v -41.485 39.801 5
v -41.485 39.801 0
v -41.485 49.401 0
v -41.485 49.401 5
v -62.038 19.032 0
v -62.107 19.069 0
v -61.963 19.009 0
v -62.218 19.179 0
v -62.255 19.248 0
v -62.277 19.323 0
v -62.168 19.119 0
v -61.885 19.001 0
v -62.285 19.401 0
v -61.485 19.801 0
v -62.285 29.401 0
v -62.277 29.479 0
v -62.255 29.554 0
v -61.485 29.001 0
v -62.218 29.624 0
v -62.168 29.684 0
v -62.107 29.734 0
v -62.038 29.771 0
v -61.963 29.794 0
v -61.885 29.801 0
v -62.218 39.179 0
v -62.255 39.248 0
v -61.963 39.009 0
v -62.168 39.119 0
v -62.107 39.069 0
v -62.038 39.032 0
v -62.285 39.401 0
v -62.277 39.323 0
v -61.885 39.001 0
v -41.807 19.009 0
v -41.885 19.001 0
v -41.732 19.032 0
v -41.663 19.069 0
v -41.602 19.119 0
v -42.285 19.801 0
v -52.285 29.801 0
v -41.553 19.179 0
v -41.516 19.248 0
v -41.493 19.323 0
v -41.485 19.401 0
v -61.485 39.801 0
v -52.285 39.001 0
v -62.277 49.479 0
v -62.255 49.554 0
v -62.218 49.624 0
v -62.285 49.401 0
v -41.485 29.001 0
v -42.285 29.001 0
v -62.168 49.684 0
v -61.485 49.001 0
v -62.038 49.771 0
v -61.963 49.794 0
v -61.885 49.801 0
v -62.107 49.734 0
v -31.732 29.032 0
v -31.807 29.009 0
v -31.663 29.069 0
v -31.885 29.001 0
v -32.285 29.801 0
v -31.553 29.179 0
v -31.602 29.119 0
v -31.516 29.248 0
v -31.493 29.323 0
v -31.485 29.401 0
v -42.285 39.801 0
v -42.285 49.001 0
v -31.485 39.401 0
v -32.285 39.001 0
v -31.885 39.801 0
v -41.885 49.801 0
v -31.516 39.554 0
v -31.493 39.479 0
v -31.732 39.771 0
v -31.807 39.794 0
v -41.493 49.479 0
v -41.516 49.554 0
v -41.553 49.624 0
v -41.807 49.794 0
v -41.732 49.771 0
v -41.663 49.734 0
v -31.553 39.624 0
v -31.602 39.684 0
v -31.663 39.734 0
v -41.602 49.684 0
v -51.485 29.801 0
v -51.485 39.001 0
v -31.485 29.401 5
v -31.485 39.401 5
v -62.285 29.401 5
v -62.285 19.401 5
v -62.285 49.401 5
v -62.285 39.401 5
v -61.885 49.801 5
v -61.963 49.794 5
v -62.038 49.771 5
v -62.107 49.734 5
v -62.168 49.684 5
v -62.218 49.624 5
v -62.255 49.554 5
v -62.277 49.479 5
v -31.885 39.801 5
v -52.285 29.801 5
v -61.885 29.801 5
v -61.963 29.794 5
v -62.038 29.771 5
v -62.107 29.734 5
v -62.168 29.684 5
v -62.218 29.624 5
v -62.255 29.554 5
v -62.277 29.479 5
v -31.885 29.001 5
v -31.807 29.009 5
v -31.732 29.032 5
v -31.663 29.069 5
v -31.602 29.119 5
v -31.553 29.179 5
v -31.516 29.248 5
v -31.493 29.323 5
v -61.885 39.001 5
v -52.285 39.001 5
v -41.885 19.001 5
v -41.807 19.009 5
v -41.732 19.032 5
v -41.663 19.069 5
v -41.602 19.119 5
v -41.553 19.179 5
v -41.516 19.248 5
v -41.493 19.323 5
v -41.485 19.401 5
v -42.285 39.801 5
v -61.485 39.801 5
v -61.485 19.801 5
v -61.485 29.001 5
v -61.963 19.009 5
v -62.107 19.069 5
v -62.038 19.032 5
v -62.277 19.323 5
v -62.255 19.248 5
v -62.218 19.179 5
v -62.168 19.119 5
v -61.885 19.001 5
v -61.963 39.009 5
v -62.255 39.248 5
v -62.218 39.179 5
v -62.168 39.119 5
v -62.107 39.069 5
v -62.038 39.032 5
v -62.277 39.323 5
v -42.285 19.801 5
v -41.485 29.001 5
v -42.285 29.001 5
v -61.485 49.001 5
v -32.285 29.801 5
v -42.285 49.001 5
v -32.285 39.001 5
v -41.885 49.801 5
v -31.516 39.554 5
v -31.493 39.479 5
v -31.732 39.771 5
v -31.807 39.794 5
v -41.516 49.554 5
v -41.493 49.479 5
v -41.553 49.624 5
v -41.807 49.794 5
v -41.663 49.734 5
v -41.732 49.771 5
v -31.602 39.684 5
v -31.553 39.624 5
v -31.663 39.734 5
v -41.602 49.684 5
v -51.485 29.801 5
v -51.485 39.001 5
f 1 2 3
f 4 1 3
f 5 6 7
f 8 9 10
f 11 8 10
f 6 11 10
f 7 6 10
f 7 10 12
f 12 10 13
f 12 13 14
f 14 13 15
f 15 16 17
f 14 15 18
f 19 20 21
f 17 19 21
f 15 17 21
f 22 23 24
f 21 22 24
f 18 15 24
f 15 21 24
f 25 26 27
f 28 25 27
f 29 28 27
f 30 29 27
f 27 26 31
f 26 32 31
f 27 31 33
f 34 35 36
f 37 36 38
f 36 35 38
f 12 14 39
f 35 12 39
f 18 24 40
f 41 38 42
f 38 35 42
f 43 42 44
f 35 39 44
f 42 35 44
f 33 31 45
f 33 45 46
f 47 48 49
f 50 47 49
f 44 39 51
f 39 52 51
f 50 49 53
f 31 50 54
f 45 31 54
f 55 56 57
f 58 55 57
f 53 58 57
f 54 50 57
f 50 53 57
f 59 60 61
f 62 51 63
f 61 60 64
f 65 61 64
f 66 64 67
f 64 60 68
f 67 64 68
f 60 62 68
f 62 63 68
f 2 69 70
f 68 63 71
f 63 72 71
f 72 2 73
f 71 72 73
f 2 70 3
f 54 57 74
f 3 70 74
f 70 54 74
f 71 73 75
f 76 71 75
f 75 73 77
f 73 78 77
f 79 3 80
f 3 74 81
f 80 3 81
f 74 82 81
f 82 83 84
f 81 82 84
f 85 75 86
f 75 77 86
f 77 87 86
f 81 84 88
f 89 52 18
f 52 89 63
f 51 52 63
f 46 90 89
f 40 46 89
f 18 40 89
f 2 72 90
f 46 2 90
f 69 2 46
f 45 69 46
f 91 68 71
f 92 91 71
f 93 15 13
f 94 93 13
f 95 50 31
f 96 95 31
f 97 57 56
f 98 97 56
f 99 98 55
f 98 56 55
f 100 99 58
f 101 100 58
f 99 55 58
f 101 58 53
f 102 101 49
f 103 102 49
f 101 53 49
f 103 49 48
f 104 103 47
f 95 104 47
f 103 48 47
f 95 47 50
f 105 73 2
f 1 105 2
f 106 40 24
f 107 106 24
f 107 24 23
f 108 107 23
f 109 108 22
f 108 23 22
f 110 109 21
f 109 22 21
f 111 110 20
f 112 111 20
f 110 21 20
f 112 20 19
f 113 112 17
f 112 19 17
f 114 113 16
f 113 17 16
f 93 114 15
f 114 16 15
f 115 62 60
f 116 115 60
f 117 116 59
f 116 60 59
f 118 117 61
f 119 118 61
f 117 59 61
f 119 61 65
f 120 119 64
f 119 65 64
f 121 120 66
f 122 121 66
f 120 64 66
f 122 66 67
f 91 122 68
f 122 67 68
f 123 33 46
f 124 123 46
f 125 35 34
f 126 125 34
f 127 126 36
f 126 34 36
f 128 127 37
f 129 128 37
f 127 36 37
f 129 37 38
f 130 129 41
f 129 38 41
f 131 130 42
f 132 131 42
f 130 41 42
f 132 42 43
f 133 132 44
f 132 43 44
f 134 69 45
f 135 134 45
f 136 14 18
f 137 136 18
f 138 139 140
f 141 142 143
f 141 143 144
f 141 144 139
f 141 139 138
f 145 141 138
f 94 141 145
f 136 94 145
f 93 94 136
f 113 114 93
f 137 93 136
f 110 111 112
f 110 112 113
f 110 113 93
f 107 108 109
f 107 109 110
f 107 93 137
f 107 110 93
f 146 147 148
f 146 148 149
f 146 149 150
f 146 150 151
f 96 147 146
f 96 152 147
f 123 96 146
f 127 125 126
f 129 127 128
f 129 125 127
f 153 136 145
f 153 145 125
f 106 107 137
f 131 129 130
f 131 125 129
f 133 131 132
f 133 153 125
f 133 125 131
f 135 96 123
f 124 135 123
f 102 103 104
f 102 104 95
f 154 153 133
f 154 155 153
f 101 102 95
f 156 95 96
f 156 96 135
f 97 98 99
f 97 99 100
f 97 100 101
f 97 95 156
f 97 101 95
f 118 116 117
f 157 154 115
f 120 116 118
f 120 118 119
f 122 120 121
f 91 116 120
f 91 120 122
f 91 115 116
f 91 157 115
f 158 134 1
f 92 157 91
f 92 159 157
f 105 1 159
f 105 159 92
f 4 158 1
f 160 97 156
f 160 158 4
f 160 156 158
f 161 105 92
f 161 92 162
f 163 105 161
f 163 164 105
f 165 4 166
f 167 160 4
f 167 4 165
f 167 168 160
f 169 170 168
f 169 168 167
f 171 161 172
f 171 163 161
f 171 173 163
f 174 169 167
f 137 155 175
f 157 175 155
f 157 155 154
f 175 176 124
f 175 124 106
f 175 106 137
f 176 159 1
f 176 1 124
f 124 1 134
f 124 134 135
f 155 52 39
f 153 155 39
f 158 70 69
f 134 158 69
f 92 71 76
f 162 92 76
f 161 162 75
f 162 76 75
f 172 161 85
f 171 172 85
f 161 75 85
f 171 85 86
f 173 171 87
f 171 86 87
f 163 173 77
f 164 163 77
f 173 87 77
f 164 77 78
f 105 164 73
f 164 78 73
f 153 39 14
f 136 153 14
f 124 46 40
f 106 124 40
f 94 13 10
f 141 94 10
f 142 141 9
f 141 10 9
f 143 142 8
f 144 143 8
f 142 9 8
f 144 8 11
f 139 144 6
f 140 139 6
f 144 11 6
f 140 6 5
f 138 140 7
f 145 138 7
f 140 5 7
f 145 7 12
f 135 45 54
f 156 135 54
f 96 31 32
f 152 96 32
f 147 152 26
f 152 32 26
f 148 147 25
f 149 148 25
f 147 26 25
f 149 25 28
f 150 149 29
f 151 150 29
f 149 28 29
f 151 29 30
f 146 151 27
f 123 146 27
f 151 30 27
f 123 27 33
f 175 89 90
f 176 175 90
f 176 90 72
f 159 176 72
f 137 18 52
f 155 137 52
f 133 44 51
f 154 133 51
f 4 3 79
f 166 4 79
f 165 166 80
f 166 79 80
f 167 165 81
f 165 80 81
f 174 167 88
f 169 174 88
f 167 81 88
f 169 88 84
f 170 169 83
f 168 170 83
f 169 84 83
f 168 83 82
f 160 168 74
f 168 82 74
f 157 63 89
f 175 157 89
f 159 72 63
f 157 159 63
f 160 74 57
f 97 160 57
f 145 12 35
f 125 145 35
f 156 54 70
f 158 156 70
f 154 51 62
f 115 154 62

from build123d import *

# Parameters (mm, degrees)
F1_DEPTH = 5


with BuildPart() as f1:
    # F0 (on Top) → F1 (new body)
    with BuildSketch(Plane.XY):
        with BuildLine():
            Line((-41.8851405949, 29.0013556838), (-42.2851405949, 29.0013556838))
            Line((-42.2851405949, 29.0013556838), (-42.2851405949, 19.8013556838))
            Line((-42.2851405949, 19.8013556838), (-41.8851405949, 19.8013556838))
            ThreePointArc((-41.8851405949, 19.8013556838), (-41.6022978824, 19.6841983963), (-41.4851405949, 19.4013556838))
            Line((-41.4851405949, 19.4013556838), (-41.4851405949, 29.0013556838))
            Line((-41.4851405949, 29.0013556838), (-41.8851405949, 29.0013556838))
        make_face()
        with BuildLine():
            ThreePointArc((-41.4851405949, 39.4013556838), (-41.6022978824, 39.1185129713), (-41.8851405949, 39.0013556838))
            Line((-41.8851405949, 39.0013556838), (-32.2851405949, 39.0013556838))
            Line((-32.2851405949, 39.0013556838), (-32.2851405949, 39.4013556838))
            ThreePointArc((-32.2851405949, 39.4013556838), (-32.1679833073, 39.6841983963), (-31.8851405949, 39.8013556838))
            Line((-31.8851405949, 39.8013556838), (-41.4851405949, 39.8013556838))
            Line((-41.4851405949, 39.8013556838), (-41.4851405949, 39.4013556838))
        make_face()
        Polygon((-52.2851405949, 39.0013556838), (-52.2851405949, 29.8013556838), (-51.8851405949, 29.8013556838), (-51.4851405949, 29.8013556838), (-51.4851405949, 39.0013556838), (-51.8851405949, 39.0013556838), align=None)
        with BuildLine():
            Line((-62.2851405949, 49.4013556838), (-62.2851405949, 39.4013556838))
            ThreePointArc((-62.2851405949, 39.4013556838), (-62.1679833073, 39.6841983963), (-61.8851405949, 39.8013556838))
            Line((-61.8851405949, 39.8013556838), (-61.4851405949, 39.8013556838))
            Line((-61.4851405949, 39.8013556838), (-61.4851405949, 49.0013556838))
            Line((-61.4851405949, 49.0013556838), (-61.8851405949, 49.0013556838))
            ThreePointArc((-61.8851405949, 49.0013556838), (-62.1679833073, 49.1185129713), (-62.2851405949, 49.4013556838))
        make_face()
        with BuildLine():
            Line((-41.8851405949, 49.8013556838), (-61.8851405949, 49.8013556838))
            ThreePointArc((-61.8851405949, 49.8013556838), (-61.6022978824, 49.6841983963), (-61.4851405949, 49.4013556838))
            Line((-61.4851405949, 49.4013556838), (-61.4851405949, 49.0013556838))
            Line((-61.4851405949, 49.0013556838), (-42.2851405949, 49.0013556838))
            Line((-42.2851405949, 49.0013556838), (-42.2851405949, 49.4013556838))
            ThreePointArc((-42.2851405949, 49.4013556838), (-42.1679833073, 49.6841983963), (-41.8851405949, 49.8013556838))
        make_face()
        with BuildLine():
            Line((-61.4851405949, 29.0013556838), (-61.8851405949, 29.0013556838))
            ThreePointArc((-61.8851405949, 29.0013556838), (-62.1679833073, 29.1185129713), (-62.2851405949, 29.4013556838))
            Line((-62.2851405949, 29.4013556838), (-62.2851405949, 19.4013556838))
            ThreePointArc((-62.2851405949, 19.4013556838), (-62.1679833073, 19.6841983963), (-61.8851405949, 19.8013556838))
            Line((-61.8851405949, 19.8013556838), (-61.4851405949, 19.8013556838))
            Line((-61.4851405949, 19.8013556838), (-61.4851405949, 29.0013556838))
        make_face()
        with BuildLine():
            Line((-42.2851405949, 19.8013556838), (-61.4851405949, 19.8013556838))
            Line((-61.4851405949, 19.8013556838), (-61.4851405949, 19.4013556838))
            ThreePointArc((-61.4851405949, 19.4013556838), (-61.6022978824, 19.1185129713), (-61.8851405949, 19.0013556838))
            Line((-61.8851405949, 19.0013556838), (-41.8851405949, 19.0013556838))
            ThreePointArc((-41.8851405949, 19.0013556838), (-42.1679833073, 19.1185129713), (-42.2851405949, 19.4013556838))
            Line((-42.2851405949, 19.4013556838), (-42.2851405949, 19.8013556838))
        make_face()
        with BuildLine():
            Line((-32.2851405949, 39.0013556838), (-32.2851405949, 29.8013556838))
            Line((-32.2851405949, 29.8013556838), (-31.8851405949, 29.8013556838))
            ThreePointArc((-31.8851405949, 29.8013556838), (-31.6022978824, 29.6841983963), (-31.4851405949, 29.4013556838))
            Line((-31.4851405949, 29.4013556838), (-31.4851405949, 39.4013556838))
            ThreePointArc((-31.4851405949, 39.4013556838), (-31.6022978824, 39.1185129713), (-31.8851405949, 39.0013556838))
            Line((-31.8851405949, 39.0013556838), (-32.2851405949, 39.0013556838))
        make_face()
        with BuildLine():
            Line((-61.8851405949, 39.0013556838), (-52.2851405949, 39.0013556838))
            Line((-52.2851405949, 39.0013556838), (-52.2851405949, 39.4013556838))
            ThreePointArc((-52.2851405949, 39.4013556838), (-52.1679833073, 39.6841983963), (-51.8851405949, 39.8013556838))
            Line((-51.8851405949, 39.8013556838), (-61.4851405949, 39.8013556838))
            Line((-61.4851405949, 39.8013556838), (-61.4851405949, 39.4013556838))
            ThreePointArc((-61.4851405949, 39.4013556838), (-61.6022978824, 39.1185129713), (-61.8851405949, 39.0013556838))
        make_face()
        with BuildLine():
            Line((-42.2851405949, 49.0013556838), (-42.2851405949, 39.8013556838))
            Line((-42.2851405949, 39.8013556838), (-41.8851405949, 39.8013556838))
            Line((-41.8851405949, 39.8013556838), (-41.4851405949, 39.8013556838))
            Line((-41.4851405949, 39.8013556838), (-41.4851405949, 49.4013556838))
            ThreePointArc((-41.4851405949, 49.4013556838), (-41.6022978824, 49.1185129713), (-41.8851405949, 49.0013556838))
            Line((-41.8851405949, 49.0013556838), (-42.2851405949, 49.0013556838))
        make_face()
        with BuildLine():
            Line((-51.4851405949, 39.4013556838), (-51.4851405949, 39.0013556838))
            Line((-51.4851405949, 39.0013556838), (-41.8851405949, 39.0013556838))
            ThreePointArc((-41.8851405949, 39.0013556838), (-42.1679833073, 39.1185129713), (-42.2851405949, 39.4013556838))
            Line((-42.2851405949, 39.4013556838), (-42.2851405949, 39.8013556838))
            Line((-42.2851405949, 39.8013556838), (-51.8851405949, 39.8013556838))
            ThreePointArc((-51.8851405949, 39.8013556838), (-51.6022978824, 39.6841983963), (-51.4851405949, 39.4013556838))
        make_face()
        with BuildLine():
            ThreePointArc((-41.8851405949, 29.8013556838), (-41.6022978824, 29.6841983963), (-41.4851405949, 29.4013556838))
            Line((-41.4851405949, 29.4013556838), (-41.4851405949, 29.0013556838))
            Line((-41.4851405949, 29.0013556838), (-31.8851405949, 29.0013556838))
            ThreePointArc((-31.8851405949, 29.0013556838), (-32.1679833073, 29.1185129713), (-32.2851405949, 29.4013556838))
            Line((-32.2851405949, 29.4013556838), (-32.2851405949, 29.8013556838))
            Line((-32.2851405949, 29.8013556838), (-41.8851405949, 29.8013556838))
        make_face()
        with BuildLine():
            Line((-61.4851405949, 29.4013556838), (-61.4851405949, 29.0013556838))
            Line((-61.4851405949, 29.0013556838), (-51.8851405949, 29.0013556838))
            ThreePointArc((-51.8851405949, 29.0013556838), (-52.1679833073, 29.1185129713), (-52.2851405949, 29.4013556838))
            Line((-52.2851405949, 29.4013556838), (-52.2851405949, 29.8013556838))
            Line((-52.2851405949, 29.8013556838), (-61.8851405949, 29.8013556838))
            ThreePointArc((-61.8851405949, 29.8013556838), (-61.6022978824, 29.6841983963), (-61.4851405949, 29.4013556838))
        make_face()
        with BuildLine():
            ThreePointArc((-51.4851405949, 29.4013556838), (-51.6022978824, 29.1185129713), (-51.8851405949, 29.0013556838))
            Line((-51.8851405949, 29.0013556838), (-42.2851405949, 29.0013556838))
            Line((-42.2851405949, 29.0013556838), (-42.2851405949, 29.4013556838))
            ThreePointArc((-42.2851405949, 29.4013556838), (-42.1679833073, 29.6841983963), (-41.8851405949, 29.8013556838))
            Line((-41.8851405949, 29.8013556838), (-51.4851405949, 29.8013556838))
            Line((-51.4851405949, 29.8013556838), (-51.4851405949, 29.4013556838))
        make_face()
        with BuildLine():
            ThreePointArc((-42.2851405949, 39.4013556838), (-42.1679833073, 39.1185129713), (-41.8851405949, 39.0013556838))
            ThreePointArc((-41.8851405949, 39.0013556838), (-41.6022978824, 39.1185129713), (-41.4851405949, 39.4013556838))
            ThreePointArc((-41.4851405949, 39.4013556838), (-41.6022978824, 39.6841983963), (-41.8851405949, 39.8013556838))
            Line((-41.8851405949, 39.8013556838), (-42.2851405949, 39.8013556838))
            Line((-42.2851405949, 39.8013556838), (-42.2851405949, 39.4013556838))
        make_face()
        with BuildLine():
            Line((-32.2851405949, 39.4013556838), (-32.2851405949, 39.0013556838))
            Line((-32.2851405949, 39.0013556838), (-31.8851405949, 39.0013556838))
            ThreePointArc((-31.8851405949, 39.0013556838), (-31.6022978824, 39.1185129713), (-31.4851405949, 39.4013556838))
            ThreePointArc((-31.4851405949, 39.4013556838), (-31.6022978824, 39.6841983963), (-31.8851405949, 39.8013556838))
            ThreePointArc((-31.8851405949, 39.8013556838), (-32.1679833073, 39.6841983963), (-32.2851405949, 39.4013556838))
        make_face()
        with BuildLine():
            Line((-41.8851405949, 19.8013556838), (-42.2851405949, 19.8013556838))
            Line((-42.2851405949, 19.8013556838), (-42.2851405949, 19.4013556838))
            ThreePointArc((-42.2851405949, 19.4013556838), (-42.1679833073, 19.1185129713), (-41.8851405949, 19.0013556838))
            ThreePointArc((-41.8851405949, 19.0013556838), (-41.6022978824, 19.1185129713), (-41.4851405949, 19.4013556838))
            ThreePointArc((-41.4851405949, 19.4013556838), (-41.6022978824, 19.6841983963), (-41.8851405949, 19.8013556838))
        make_face()
        with BuildLine():
            ThreePointArc((-32.2851405949, 29.4013556838), (-32.1679833073, 29.1185129713), (-31.8851405949, 29.0013556838))
            ThreePointArc((-31.8851405949, 29.0013556838), (-31.6022978824, 29.1185129713), (-31.4851405949, 29.4013556838))
            ThreePointArc((-31.4851405949, 29.4013556838), (-31.6022978824, 29.6841983963), (-31.8851405949, 29.8013556838))
            Line((-31.8851405949, 29.8013556838), (-32.2851405949, 29.8013556838))
            Line((-32.2851405949, 29.8013556838), (-32.2851405949, 29.4013556838))
        make_face()
        with BuildLine():
            Line((-42.2851405949, 29.4013556838), (-42.2851405949, 29.0013556838))
            Line((-42.2851405949, 29.0013556838), (-41.8851405949, 29.0013556838))
            ThreePointArc((-41.8851405949, 29.0013556838), (-41.6022978824, 29.1185129713), (-41.4851405949, 29.4013556838))
            ThreePointArc((-41.4851405949, 29.4013556838), (-41.6022978824, 29.6841983963), (-41.8851405949, 29.8013556838))
            ThreePointArc((-41.8851405949, 29.8013556838), (-42.1679833073, 29.6841983963), (-42.2851405949, 29.4013556838))
        make_face()
        with BuildLine():
            ThreePointArc((-52.2851405949, 39.4013556838), (-52.1679833073, 39.1185129713), (-51.8851405949, 39.0013556838))
            Line((-51.8851405949, 39.0013556838), (-51.4851405949, 39.0013556838))
            Line((-51.4851405949, 39.0013556838), (-51.4851405949, 39.4013556838))
            ThreePointArc((-51.4851405949, 39.4013556838), (-51.6022978824, 39.6841983963), (-51.8851405949, 39.8013556838))
            ThreePointArc((-51.8851405949, 39.8013556838), (-52.1679833073, 39.6841983963), (-52.2851405949, 39.4013556838))
        make_face()
        with BuildLine():
            ThreePointArc((-41.8851405949, 39.8013556838), (-41.6022978824, 39.6841983963), (-41.4851405949, 39.4013556838))
            Line((-41.4851405949, 39.4013556838), (-41.4851405949, 39.8013556838))
            Line((-41.4851405949, 39.8013556838), (-41.8851405949, 39.8013556838))
        make_face()
        with BuildLine():
            ThreePointArc((-62.2851405949, 29.4013556838), (-62.1679833073, 29.1185129713), (-61.8851405949, 29.0013556838))
            Line((-61.8851405949, 29.0013556838), (-61.4851405949, 29.0013556838))
            Line((-61.4851405949, 29.0013556838), (-61.4851405949, 29.4013556838))
            ThreePointArc((-61.4851405949, 29.4013556838), (-61.6022978824, 29.6841983963), (-61.8851405949, 29.8013556838))
            ThreePointArc((-61.8851405949, 29.8013556838), (-62.1679833073, 29.6841983963), (-62.2851405949, 29.4013556838))
        make_face()
        with BuildLine():
            ThreePointArc((-61.8851405949, 19.8013556838), (-62.1679833073, 19.6841983963), (-62.2851405949, 19.4013556838))
            ThreePointArc((-62.2851405949, 19.4013556838), (-62.1679833073, 19.1185129713), (-61.8851405949, 19.0013556838))
            ThreePointArc((-61.8851405949, 19.0013556838), (-61.6022978824, 19.1185129713), (-61.4851405949, 19.4013556838))
            Line((-61.4851405949, 19.4013556838), (-61.4851405949, 19.8013556838))
            Line((-61.4851405949, 19.8013556838), (-61.8851405949, 19.8013556838))
        make_face()
        with BuildLine():
            ThreePointArc((-61.8851405949, 49.8013556838), (-62.1679833073, 49.6841983963), (-62.2851405949, 49.4013556838))
            ThreePointArc((-62.2851405949, 49.4013556838), (-62.1679833073, 49.1185129713), (-61.8851405949, 49.0013556838))
            Line((-61.8851405949, 49.0013556838), (-61.4851405949, 49.0013556838))
            Line((-61.4851405949, 49.0013556838), (-61.4851405949, 49.4013556838))
            ThreePointArc((-61.4851405949, 49.4013556838), (-61.6022978824, 49.6841983963), (-61.8851405949, 49.8013556838))
        make_face()
        with BuildLine():
            ThreePointArc((-62.2851405949, 39.4013556838), (-62.1679833073, 39.1185129713), (-61.8851405949, 39.0013556838))
            ThreePointArc((-61.8851405949, 39.0013556838), (-61.6022978824, 39.1185129713), (-61.4851405949, 39.4013556838))
            Line((-61.4851405949, 39.4013556838), (-61.4851405949, 39.8013556838))
            Line((-61.4851405949, 39.8013556838), (-61.8851405949, 39.8013556838))
            ThreePointArc((-61.8851405949, 39.8013556838), (-62.1679833073, 39.6841983963), (-62.2851405949, 39.4013556838))
        make_face()
        with BuildLine():
            ThreePointArc((-41.4851405949, 29.4013556838), (-41.6022978824, 29.1185129713), (-41.8851405949, 29.0013556838))
            Line((-41.8851405949, 29.0013556838), (-41.4851405949, 29.0013556838))
            Line((-41.4851405949, 29.0013556838), (-41.4851405949, 29.4013556838))
        make_face()
        with BuildLine():
            ThreePointArc((-52.2851405949, 29.4013556838), (-52.1679833073, 29.1185129713), (-51.8851405949, 29.0013556838))
            ThreePointArc((-51.8851405949, 29.0013556838), (-51.6022978824, 29.1185129713), (-51.4851405949, 29.4013556838))
            Line((-51.4851405949, 29.4013556838), (-51.4851405949, 29.8013556838))
            Line((-51.4851405949, 29.8013556838), (-51.8851405949, 29.8013556838))
            ThreePointArc((-51.8851405949, 29.8013556838), (-52.1679833073, 29.6841983963), (-52.2851405949, 29.4013556838))
        make_face()
        with BuildLine():
            Line((-52.2851405949, 39.4013556838), (-52.2851405949, 39.0013556838))
            Line((-52.2851405949, 39.0013556838), (-51.8851405949, 39.0013556838))
            ThreePointArc((-51.8851405949, 39.0013556838), (-52.1679833073, 39.1185129713), (-52.2851405949, 39.4013556838))
        make_face()
        with BuildLine():
            Line((-42.2851405949, 49.4013556838), (-42.2851405949, 49.0013556838))
            Line((-42.2851405949, 49.0013556838), (-41.8851405949, 49.0013556838))
            ThreePointArc((-41.8851405949, 49.0013556838), (-41.6022978824, 49.1185129713), (-41.4851405949, 49.4013556838))
            ThreePointArc((-41.4851405949, 49.4013556838), (-41.6022978824, 49.6841983963), (-41.8851405949, 49.8013556838))
            ThreePointArc((-41.8851405949, 49.8013556838), (-42.1679833073, 49.6841983963), (-42.2851405949, 49.4013556838))
        make_face()
        with BuildLine():
            Line((-51.8851405949, 29.8013556838), (-52.2851405949, 29.8013556838))
            Line((-52.2851405949, 29.8013556838), (-52.2851405949, 29.4013556838))
            ThreePointArc((-52.2851405949, 29.4013556838), (-52.1679833073, 29.6841983963), (-51.8851405949, 29.8013556838))
        make_face()
    extrude(amount=F1_DEPTH)


solid = f1.part
